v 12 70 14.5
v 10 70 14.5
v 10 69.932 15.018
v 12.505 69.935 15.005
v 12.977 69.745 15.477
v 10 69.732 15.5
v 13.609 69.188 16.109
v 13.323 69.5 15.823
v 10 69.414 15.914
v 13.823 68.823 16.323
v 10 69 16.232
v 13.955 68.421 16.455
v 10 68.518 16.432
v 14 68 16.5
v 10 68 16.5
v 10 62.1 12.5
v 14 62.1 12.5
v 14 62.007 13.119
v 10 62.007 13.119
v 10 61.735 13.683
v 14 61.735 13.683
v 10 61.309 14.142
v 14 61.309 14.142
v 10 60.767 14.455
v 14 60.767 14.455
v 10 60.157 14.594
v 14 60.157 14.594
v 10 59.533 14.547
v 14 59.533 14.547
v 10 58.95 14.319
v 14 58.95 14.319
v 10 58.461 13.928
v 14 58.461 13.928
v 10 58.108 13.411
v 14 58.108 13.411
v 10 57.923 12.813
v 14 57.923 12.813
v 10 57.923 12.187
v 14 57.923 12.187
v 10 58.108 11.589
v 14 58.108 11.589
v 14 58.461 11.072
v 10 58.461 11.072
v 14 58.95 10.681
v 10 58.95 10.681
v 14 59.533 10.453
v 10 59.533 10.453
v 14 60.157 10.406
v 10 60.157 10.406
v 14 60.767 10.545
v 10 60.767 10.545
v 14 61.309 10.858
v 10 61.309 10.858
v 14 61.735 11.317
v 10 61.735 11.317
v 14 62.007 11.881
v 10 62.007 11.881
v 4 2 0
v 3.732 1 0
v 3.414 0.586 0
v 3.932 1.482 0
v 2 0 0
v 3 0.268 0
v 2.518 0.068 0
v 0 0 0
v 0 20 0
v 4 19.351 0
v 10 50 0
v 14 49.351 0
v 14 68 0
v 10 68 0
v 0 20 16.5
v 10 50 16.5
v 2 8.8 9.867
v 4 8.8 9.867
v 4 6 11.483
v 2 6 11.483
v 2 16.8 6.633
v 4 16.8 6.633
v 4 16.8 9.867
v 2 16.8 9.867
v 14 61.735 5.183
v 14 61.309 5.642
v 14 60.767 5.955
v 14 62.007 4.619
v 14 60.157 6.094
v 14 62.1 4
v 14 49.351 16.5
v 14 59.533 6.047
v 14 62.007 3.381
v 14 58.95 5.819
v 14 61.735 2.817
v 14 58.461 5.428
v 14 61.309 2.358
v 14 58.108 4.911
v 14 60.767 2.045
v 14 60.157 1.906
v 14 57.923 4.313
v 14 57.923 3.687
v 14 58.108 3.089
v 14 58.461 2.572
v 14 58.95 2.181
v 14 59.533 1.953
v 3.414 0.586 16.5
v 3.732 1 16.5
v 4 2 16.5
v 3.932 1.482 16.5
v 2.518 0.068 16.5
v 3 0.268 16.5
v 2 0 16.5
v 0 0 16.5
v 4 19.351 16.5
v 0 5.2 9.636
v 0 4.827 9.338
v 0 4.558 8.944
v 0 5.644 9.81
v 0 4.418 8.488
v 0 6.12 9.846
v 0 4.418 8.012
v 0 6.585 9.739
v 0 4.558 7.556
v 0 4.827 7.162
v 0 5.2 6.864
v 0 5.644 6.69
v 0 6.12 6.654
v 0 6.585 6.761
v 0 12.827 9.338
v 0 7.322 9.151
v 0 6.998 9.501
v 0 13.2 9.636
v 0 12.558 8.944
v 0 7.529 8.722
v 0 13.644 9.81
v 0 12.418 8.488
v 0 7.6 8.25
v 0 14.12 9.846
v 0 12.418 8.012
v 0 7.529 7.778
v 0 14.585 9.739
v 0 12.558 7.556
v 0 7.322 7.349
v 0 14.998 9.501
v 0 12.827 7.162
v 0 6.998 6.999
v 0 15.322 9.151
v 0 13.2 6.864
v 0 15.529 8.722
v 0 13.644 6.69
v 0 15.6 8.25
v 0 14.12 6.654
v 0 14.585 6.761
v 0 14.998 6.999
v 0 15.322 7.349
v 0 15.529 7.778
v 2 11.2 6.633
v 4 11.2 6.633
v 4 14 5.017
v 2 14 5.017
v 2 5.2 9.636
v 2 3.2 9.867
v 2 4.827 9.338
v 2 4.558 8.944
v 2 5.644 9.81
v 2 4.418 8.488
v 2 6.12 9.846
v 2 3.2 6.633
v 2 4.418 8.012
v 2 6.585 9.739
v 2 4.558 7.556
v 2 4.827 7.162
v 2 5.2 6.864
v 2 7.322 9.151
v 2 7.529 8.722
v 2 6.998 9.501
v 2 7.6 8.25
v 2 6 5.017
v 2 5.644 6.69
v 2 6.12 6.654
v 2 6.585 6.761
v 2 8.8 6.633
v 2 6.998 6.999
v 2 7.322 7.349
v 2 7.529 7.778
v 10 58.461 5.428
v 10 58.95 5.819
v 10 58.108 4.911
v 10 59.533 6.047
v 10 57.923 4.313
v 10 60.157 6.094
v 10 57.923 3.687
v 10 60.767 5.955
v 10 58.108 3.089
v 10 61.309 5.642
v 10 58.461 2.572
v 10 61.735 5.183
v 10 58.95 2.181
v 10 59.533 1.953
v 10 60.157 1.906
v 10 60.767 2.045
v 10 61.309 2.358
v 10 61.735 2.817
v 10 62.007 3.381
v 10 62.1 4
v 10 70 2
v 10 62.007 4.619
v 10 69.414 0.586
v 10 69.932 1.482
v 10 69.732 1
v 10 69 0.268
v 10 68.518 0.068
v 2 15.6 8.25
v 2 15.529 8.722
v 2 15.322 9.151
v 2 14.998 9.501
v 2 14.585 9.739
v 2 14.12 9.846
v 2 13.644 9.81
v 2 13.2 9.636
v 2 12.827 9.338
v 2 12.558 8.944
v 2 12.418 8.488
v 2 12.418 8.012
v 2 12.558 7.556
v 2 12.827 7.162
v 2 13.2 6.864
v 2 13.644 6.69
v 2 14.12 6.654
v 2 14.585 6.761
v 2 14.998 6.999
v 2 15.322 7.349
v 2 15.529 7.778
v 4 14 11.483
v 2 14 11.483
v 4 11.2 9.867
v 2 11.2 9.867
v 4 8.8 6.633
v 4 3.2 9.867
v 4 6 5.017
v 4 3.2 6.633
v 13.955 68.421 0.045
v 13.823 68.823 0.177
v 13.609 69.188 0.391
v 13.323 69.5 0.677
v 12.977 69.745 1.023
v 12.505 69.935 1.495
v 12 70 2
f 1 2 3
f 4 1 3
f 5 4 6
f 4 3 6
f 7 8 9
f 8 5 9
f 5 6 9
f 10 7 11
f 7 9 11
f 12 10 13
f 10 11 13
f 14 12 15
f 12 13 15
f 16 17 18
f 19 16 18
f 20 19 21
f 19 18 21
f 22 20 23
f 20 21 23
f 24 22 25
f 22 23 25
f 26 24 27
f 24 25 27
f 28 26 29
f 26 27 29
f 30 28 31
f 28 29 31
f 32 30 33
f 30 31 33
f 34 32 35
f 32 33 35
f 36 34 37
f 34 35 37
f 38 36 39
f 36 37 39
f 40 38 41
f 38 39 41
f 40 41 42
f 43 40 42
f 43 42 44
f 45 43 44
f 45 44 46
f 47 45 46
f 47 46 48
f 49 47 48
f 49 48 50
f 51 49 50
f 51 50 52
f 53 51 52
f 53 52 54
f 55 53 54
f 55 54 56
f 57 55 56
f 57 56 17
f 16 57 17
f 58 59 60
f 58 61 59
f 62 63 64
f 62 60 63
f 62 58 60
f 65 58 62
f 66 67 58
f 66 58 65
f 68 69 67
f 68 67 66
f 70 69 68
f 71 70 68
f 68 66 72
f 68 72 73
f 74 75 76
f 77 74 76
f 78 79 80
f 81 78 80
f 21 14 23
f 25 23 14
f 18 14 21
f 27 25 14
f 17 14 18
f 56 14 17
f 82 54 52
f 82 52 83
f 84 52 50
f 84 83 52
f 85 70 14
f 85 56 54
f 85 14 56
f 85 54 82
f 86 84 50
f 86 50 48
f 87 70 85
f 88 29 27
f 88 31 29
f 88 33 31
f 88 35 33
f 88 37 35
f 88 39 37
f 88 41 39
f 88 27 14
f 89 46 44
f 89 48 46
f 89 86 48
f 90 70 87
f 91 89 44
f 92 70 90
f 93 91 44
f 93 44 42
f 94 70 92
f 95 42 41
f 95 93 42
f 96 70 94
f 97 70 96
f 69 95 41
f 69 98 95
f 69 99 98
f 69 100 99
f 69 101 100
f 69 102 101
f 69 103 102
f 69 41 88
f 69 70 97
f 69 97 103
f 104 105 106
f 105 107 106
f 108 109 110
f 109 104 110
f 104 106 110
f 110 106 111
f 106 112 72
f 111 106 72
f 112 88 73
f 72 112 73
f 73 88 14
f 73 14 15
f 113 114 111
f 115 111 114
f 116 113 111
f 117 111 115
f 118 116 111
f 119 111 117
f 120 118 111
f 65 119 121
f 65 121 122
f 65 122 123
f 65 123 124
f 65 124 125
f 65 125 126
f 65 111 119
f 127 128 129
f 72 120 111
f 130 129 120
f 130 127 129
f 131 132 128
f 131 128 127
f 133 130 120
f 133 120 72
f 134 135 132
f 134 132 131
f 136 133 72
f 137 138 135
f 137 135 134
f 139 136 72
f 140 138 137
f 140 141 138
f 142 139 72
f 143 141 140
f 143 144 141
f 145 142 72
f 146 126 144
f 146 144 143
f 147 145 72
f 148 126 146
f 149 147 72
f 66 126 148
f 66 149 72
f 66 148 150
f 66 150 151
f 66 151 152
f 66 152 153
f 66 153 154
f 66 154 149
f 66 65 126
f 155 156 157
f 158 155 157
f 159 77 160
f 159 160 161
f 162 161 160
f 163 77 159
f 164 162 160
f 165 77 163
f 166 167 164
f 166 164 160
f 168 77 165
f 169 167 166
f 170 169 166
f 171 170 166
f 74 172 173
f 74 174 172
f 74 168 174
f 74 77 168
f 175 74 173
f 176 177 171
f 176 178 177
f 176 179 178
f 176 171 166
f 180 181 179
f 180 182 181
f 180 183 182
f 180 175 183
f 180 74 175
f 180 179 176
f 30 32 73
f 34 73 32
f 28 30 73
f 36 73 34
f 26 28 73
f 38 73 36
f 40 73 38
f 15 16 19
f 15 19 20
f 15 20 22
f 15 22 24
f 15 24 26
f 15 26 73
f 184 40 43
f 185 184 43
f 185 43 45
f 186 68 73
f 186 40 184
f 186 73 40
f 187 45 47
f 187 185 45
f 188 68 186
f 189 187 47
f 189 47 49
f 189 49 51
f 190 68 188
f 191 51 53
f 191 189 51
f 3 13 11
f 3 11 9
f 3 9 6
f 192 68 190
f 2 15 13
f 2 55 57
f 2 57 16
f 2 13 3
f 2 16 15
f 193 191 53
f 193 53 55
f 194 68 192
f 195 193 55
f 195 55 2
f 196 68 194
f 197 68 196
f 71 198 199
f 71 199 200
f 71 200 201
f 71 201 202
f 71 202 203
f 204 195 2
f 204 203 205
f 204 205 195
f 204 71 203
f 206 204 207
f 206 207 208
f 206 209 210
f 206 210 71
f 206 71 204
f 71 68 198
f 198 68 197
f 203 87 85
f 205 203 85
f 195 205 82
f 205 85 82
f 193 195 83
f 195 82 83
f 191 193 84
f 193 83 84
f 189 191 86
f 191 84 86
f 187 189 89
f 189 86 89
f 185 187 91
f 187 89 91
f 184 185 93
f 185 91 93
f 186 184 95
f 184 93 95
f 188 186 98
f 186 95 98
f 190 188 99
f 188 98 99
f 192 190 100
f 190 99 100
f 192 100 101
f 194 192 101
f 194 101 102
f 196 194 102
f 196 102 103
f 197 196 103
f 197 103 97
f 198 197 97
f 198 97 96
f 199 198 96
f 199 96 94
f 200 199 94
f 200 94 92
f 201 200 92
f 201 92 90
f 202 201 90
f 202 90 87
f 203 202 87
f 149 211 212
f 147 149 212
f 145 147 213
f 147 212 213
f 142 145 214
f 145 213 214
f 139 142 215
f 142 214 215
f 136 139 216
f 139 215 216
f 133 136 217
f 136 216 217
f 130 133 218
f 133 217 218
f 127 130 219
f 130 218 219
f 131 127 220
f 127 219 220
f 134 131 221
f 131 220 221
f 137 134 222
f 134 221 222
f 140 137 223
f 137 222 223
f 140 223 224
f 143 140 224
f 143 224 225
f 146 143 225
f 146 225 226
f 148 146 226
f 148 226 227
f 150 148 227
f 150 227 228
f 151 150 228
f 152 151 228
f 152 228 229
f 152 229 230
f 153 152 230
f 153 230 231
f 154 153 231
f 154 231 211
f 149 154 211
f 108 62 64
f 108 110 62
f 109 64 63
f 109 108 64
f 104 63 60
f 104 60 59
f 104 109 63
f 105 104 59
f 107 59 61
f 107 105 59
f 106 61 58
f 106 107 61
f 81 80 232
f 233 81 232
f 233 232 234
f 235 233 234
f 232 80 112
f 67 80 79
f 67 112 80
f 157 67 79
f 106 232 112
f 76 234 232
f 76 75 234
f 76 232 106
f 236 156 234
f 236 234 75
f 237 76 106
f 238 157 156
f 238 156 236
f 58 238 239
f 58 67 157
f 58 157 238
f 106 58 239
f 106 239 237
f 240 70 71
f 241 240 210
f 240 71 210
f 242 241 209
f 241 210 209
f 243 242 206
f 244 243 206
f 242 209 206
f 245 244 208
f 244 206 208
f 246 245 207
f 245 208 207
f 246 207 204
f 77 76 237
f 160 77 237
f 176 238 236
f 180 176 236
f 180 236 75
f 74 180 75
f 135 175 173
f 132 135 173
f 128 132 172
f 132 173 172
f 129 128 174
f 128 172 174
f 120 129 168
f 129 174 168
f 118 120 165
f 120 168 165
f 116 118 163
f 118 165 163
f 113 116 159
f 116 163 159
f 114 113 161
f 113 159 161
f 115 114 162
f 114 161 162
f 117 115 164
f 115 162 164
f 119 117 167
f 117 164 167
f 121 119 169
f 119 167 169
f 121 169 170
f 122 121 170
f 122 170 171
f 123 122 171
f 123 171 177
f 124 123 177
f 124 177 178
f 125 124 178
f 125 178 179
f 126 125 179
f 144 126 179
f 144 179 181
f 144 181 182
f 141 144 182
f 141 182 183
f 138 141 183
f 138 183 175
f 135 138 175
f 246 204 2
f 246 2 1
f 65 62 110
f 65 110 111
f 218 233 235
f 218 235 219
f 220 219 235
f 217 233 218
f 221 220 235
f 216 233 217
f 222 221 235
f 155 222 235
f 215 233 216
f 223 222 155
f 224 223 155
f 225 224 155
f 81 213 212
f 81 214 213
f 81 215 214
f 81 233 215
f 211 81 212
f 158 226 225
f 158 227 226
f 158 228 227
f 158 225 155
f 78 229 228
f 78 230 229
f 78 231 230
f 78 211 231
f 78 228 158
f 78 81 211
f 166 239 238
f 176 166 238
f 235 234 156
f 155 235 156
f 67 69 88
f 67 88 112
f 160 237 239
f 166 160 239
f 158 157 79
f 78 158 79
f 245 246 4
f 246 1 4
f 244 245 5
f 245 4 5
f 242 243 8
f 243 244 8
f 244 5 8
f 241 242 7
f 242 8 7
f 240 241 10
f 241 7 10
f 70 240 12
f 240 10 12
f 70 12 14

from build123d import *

# Parameters (mm, degrees)
BOSS_EXTRUDE2_DEPTH = 16.5
SKETCH4_R           = 2.1
CUT_EXTRUDE2_DEPTH  = 16.5
CUT_EXTRUDE3_REACH  = 74.61
SKETCH5_R           = 1.6
FILLET1_R           = 2
FILLET2_R           = 2
CUT_EXTRUDE4_DEPTH  = 2


with BuildPart() as part:
    # Sketch3 → Boss-Extrude2 (new body)
    with BuildSketch(Plane.XY):
        Polygon((0, 0), (0, 20), (10, 50), (10, 70), (14, 70), (14, 49.350889359), (4, 19.350889359), (4, 0), align=None)
    extrude(amount=BOSS_EXTRUDE2_DEPTH)

    # Sketch4 → Cut-Extrude2 (cut)
    with BuildSketch(Plane(origin=(14, 0, 0), x_dir=(0, 0, -1), z_dir=(1, 0, 0))):
        with Locations(Location((-12.5, 60, 0), (0, 0, 90))):
            Circle(SKETCH4_R)
        with Locations(Location((-4, 60, 0), (0, 0, 90))):
            Circle(SKETCH4_R)
    extrude(amount=-CUT_EXTRUDE2_DEPTH, mode=Mode.SUBTRACT)

    # Sketch5 → Cut-Extrude3 (cut, up to next)
    with BuildSketch(Plane(origin=(4, 0, 0), x_dir=(0, 0, -1), z_dir=(1, 0, 0)), mode=Mode.PRIVATE) as cut_extrude3_sk1:
        with Locations(Location((-8.25, 14, 0), (0, 0, 90))):
            Circle(SKETCH5_R)
    cut_extrude3_tool1 = extrude(cut_extrude3_sk1.sketch, amount=-CUT_EXTRUDE3_REACH, mode=Mode.PRIVATE) & part.part
    # Sketch5 → Cut-Extrude3 (cut, up to next)
    with BuildSketch(Plane(origin=(4, 0, 0), x_dir=(0, 0, -1), z_dir=(1, 0, 0)), mode=Mode.PRIVATE) as cut_extrude3_sk2:
        with Locations(Location((-8.25, 6, 0), (0, 0, 90))):
            Circle(SKETCH5_R)
    cut_extrude3_tool2 = extrude(cut_extrude3_sk2.sketch, amount=-CUT_EXTRUDE3_REACH, mode=Mode.PRIVATE) & part.part
    add(cut_extrude3_tool1.solids().sort_by_distance((4, 14, 8.25))[0], mode=Mode.SUBTRACT)
    add(cut_extrude3_tool2.solids().sort_by_distance((4, 6, 8.25))[0], mode=Mode.SUBTRACT)

    # Fillet1
    fillet1_edges = [part.edges().sort_by_distance(p)[0] for p in [
        (14, 70, 8.25),
        (4, 0, 8.25),
    ]]
    fillet(fillet1_edges, radius=FILLET1_R)

    # Fillet2
    # the kernel refuses this fillet: 2 mm, written as the material it takes off along each edge
    with BuildSketch(Plane(origin=(5, 70, 0), x_dir=(0, -1, 0), z_dir=(1, 0, 0))) as fillet2_piece_1:
        with BuildLine():
            CenterArc((FILLET2_R, -FILLET2_R), FILLET2_R, 90, 90)
            Line((0, -FILLET2_R), (0, 0))
            Line((0, 0), (FILLET2_R, 0))
        make_face()
    extrude(amount=12, mode=Mode.SUBTRACT)
    with BuildSketch(Plane(origin=(5, 70, 16.5), x_dir=(0, -1, 0), z_dir=(1, 0, 0))) as fillet2_piece_2:
        with BuildLine():
            CenterArc((FILLET2_R, FILLET2_R), FILLET2_R, 180, 90)
            Line((0, FILLET2_R), (0, 0))
            Line((0, 0), (FILLET2_R, 0))
        make_face()
    extrude(amount=12, mode=Mode.SUBTRACT)

    # Sketch6 → Cut-Extrude4 (cut)
    with BuildSketch(Plane(origin=(4, 0, 0), x_dir=(0, 0, -1), z_dir=(1, 0, 0))):
        Polygon((-5.016838493, 14), (-6.633419246, 16.8), (-9.866580754, 16.8), (-11.483161507, 14), (-9.866580754, 11.2), (-6.633419246, 11.2), align=None)
        Polygon((-6.633419246, 8.8), (-9.866580754, 8.8), (-11.483161507, 6), (-9.866580754, 3.2), (-6.633419246, 3.2), (-5.016838493, 6), align=None)
    extrude(amount=-CUT_EXTRUDE4_DEPTH, mode=Mode.SUBTRACT)


solid = part.part
